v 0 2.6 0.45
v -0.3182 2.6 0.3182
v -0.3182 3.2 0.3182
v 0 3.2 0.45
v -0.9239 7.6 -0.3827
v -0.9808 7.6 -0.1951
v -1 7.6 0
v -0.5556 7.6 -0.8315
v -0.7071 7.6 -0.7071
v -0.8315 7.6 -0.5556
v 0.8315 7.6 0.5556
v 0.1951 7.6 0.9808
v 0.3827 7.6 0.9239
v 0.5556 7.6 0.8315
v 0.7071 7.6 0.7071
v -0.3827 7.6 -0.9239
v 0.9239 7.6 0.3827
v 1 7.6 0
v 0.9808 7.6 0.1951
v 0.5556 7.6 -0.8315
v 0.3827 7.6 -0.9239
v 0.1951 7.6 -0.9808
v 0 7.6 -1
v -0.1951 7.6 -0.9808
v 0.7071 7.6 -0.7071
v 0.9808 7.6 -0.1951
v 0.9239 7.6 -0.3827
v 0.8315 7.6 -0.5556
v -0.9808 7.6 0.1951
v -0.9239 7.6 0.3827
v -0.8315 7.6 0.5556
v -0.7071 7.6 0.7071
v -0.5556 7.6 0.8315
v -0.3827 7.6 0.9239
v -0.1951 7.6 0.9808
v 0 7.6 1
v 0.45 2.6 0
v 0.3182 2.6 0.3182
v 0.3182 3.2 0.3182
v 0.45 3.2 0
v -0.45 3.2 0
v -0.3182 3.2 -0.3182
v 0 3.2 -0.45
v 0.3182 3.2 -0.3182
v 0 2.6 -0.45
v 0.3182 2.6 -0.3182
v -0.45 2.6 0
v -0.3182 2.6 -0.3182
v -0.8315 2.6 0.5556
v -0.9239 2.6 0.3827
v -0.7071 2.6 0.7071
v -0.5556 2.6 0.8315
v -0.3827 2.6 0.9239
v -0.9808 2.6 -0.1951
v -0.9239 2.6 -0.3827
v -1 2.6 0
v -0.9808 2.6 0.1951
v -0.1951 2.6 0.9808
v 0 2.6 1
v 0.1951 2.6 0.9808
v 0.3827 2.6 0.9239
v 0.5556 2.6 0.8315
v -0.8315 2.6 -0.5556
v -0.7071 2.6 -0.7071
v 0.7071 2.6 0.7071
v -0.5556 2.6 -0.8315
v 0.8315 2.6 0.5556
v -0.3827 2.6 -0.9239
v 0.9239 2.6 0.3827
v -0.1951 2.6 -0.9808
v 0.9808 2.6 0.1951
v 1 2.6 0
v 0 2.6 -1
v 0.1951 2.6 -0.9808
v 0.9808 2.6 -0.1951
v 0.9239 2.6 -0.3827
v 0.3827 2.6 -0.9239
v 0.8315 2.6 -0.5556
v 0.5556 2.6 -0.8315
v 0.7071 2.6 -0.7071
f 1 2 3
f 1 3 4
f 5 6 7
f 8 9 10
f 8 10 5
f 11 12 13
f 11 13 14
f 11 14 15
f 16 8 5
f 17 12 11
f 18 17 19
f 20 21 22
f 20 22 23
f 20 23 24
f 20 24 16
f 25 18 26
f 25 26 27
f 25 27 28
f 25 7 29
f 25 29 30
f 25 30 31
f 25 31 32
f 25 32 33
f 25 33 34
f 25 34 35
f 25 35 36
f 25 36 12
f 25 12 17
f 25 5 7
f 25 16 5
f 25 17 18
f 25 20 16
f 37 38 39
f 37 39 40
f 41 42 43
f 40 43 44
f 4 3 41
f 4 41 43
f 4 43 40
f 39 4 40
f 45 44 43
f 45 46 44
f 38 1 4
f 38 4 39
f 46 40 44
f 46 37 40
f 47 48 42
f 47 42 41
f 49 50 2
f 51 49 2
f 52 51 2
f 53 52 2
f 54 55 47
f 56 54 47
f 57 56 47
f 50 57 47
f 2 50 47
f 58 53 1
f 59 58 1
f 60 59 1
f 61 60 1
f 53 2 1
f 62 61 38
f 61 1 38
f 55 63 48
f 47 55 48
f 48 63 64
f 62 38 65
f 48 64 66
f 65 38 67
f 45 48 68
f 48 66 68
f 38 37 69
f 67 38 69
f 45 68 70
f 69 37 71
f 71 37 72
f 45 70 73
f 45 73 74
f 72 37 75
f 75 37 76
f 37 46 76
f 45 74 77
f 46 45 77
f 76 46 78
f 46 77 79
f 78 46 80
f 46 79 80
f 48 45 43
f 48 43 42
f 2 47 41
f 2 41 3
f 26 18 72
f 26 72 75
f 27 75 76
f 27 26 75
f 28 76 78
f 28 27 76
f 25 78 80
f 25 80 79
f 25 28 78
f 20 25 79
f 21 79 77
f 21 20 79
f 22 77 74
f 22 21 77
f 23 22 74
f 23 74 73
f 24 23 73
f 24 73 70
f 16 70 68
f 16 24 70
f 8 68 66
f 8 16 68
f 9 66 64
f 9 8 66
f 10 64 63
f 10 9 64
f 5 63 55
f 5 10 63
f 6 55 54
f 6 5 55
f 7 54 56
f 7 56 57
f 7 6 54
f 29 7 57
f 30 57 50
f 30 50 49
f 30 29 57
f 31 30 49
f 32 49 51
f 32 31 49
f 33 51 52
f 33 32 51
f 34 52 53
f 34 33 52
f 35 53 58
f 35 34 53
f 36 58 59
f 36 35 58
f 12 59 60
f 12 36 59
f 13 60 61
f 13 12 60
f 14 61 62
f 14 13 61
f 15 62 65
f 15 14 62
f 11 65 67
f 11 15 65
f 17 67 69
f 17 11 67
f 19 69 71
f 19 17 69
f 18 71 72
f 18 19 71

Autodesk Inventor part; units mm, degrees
ref_plane "YZ Plane" through (0, 0, 0) normal (1, 0, 0) x (0, 1, 0)
ref_plane "Work Plane4" through (0, 0, 0) normal (0, -1, 0) x (1, 0, 0)
ref_plane "Work Plane10" through (0, 7.6, 0) normal (0, 1, 0) x (1, 0, 0)
sketch "Sketch7" plane through (0, 7.6, 0) normal (0, 1, 0) x (1, 0, 0)
  circle A0 centre (0, 0) radius 1
extrude "Extrusion7" add sketch "Sketch7" against normal blind 5
sketch "Sketch8" plane through (0, 2.6, 0) normal (0, -1, 0) x (1, 0, 0)
  line L0 (0.45, 0) -> (0.3182, -0.3182)
  line L1 (0.3182, -0.3182) -> (0, -0.45)
  line L2 (0, -0.45) -> (-0.3182, -0.3182)
  line L3 (-0.3182, -0.3182) -> (-0.45, 0)
  line L4 (-0.45, 0) -> (-0.3182, 0.3182)
  line L5 (-0.3182, 0.3182) -> (0, 0.45)
  line L6 (0, 0.45) -> (0.3182, 0.3182)
  line L7 (0.3182, 0.3182) -> (0.45, 0)
  point P0 (0, 0)
extrude "Extrusion8" cut sketch "Sketch8" against normal blind 0.6
thread "Thread4" size "M2x0.4" class "6g" standard "ANSI Metric M Profile" full length
properties part number "M2x6_D963"
